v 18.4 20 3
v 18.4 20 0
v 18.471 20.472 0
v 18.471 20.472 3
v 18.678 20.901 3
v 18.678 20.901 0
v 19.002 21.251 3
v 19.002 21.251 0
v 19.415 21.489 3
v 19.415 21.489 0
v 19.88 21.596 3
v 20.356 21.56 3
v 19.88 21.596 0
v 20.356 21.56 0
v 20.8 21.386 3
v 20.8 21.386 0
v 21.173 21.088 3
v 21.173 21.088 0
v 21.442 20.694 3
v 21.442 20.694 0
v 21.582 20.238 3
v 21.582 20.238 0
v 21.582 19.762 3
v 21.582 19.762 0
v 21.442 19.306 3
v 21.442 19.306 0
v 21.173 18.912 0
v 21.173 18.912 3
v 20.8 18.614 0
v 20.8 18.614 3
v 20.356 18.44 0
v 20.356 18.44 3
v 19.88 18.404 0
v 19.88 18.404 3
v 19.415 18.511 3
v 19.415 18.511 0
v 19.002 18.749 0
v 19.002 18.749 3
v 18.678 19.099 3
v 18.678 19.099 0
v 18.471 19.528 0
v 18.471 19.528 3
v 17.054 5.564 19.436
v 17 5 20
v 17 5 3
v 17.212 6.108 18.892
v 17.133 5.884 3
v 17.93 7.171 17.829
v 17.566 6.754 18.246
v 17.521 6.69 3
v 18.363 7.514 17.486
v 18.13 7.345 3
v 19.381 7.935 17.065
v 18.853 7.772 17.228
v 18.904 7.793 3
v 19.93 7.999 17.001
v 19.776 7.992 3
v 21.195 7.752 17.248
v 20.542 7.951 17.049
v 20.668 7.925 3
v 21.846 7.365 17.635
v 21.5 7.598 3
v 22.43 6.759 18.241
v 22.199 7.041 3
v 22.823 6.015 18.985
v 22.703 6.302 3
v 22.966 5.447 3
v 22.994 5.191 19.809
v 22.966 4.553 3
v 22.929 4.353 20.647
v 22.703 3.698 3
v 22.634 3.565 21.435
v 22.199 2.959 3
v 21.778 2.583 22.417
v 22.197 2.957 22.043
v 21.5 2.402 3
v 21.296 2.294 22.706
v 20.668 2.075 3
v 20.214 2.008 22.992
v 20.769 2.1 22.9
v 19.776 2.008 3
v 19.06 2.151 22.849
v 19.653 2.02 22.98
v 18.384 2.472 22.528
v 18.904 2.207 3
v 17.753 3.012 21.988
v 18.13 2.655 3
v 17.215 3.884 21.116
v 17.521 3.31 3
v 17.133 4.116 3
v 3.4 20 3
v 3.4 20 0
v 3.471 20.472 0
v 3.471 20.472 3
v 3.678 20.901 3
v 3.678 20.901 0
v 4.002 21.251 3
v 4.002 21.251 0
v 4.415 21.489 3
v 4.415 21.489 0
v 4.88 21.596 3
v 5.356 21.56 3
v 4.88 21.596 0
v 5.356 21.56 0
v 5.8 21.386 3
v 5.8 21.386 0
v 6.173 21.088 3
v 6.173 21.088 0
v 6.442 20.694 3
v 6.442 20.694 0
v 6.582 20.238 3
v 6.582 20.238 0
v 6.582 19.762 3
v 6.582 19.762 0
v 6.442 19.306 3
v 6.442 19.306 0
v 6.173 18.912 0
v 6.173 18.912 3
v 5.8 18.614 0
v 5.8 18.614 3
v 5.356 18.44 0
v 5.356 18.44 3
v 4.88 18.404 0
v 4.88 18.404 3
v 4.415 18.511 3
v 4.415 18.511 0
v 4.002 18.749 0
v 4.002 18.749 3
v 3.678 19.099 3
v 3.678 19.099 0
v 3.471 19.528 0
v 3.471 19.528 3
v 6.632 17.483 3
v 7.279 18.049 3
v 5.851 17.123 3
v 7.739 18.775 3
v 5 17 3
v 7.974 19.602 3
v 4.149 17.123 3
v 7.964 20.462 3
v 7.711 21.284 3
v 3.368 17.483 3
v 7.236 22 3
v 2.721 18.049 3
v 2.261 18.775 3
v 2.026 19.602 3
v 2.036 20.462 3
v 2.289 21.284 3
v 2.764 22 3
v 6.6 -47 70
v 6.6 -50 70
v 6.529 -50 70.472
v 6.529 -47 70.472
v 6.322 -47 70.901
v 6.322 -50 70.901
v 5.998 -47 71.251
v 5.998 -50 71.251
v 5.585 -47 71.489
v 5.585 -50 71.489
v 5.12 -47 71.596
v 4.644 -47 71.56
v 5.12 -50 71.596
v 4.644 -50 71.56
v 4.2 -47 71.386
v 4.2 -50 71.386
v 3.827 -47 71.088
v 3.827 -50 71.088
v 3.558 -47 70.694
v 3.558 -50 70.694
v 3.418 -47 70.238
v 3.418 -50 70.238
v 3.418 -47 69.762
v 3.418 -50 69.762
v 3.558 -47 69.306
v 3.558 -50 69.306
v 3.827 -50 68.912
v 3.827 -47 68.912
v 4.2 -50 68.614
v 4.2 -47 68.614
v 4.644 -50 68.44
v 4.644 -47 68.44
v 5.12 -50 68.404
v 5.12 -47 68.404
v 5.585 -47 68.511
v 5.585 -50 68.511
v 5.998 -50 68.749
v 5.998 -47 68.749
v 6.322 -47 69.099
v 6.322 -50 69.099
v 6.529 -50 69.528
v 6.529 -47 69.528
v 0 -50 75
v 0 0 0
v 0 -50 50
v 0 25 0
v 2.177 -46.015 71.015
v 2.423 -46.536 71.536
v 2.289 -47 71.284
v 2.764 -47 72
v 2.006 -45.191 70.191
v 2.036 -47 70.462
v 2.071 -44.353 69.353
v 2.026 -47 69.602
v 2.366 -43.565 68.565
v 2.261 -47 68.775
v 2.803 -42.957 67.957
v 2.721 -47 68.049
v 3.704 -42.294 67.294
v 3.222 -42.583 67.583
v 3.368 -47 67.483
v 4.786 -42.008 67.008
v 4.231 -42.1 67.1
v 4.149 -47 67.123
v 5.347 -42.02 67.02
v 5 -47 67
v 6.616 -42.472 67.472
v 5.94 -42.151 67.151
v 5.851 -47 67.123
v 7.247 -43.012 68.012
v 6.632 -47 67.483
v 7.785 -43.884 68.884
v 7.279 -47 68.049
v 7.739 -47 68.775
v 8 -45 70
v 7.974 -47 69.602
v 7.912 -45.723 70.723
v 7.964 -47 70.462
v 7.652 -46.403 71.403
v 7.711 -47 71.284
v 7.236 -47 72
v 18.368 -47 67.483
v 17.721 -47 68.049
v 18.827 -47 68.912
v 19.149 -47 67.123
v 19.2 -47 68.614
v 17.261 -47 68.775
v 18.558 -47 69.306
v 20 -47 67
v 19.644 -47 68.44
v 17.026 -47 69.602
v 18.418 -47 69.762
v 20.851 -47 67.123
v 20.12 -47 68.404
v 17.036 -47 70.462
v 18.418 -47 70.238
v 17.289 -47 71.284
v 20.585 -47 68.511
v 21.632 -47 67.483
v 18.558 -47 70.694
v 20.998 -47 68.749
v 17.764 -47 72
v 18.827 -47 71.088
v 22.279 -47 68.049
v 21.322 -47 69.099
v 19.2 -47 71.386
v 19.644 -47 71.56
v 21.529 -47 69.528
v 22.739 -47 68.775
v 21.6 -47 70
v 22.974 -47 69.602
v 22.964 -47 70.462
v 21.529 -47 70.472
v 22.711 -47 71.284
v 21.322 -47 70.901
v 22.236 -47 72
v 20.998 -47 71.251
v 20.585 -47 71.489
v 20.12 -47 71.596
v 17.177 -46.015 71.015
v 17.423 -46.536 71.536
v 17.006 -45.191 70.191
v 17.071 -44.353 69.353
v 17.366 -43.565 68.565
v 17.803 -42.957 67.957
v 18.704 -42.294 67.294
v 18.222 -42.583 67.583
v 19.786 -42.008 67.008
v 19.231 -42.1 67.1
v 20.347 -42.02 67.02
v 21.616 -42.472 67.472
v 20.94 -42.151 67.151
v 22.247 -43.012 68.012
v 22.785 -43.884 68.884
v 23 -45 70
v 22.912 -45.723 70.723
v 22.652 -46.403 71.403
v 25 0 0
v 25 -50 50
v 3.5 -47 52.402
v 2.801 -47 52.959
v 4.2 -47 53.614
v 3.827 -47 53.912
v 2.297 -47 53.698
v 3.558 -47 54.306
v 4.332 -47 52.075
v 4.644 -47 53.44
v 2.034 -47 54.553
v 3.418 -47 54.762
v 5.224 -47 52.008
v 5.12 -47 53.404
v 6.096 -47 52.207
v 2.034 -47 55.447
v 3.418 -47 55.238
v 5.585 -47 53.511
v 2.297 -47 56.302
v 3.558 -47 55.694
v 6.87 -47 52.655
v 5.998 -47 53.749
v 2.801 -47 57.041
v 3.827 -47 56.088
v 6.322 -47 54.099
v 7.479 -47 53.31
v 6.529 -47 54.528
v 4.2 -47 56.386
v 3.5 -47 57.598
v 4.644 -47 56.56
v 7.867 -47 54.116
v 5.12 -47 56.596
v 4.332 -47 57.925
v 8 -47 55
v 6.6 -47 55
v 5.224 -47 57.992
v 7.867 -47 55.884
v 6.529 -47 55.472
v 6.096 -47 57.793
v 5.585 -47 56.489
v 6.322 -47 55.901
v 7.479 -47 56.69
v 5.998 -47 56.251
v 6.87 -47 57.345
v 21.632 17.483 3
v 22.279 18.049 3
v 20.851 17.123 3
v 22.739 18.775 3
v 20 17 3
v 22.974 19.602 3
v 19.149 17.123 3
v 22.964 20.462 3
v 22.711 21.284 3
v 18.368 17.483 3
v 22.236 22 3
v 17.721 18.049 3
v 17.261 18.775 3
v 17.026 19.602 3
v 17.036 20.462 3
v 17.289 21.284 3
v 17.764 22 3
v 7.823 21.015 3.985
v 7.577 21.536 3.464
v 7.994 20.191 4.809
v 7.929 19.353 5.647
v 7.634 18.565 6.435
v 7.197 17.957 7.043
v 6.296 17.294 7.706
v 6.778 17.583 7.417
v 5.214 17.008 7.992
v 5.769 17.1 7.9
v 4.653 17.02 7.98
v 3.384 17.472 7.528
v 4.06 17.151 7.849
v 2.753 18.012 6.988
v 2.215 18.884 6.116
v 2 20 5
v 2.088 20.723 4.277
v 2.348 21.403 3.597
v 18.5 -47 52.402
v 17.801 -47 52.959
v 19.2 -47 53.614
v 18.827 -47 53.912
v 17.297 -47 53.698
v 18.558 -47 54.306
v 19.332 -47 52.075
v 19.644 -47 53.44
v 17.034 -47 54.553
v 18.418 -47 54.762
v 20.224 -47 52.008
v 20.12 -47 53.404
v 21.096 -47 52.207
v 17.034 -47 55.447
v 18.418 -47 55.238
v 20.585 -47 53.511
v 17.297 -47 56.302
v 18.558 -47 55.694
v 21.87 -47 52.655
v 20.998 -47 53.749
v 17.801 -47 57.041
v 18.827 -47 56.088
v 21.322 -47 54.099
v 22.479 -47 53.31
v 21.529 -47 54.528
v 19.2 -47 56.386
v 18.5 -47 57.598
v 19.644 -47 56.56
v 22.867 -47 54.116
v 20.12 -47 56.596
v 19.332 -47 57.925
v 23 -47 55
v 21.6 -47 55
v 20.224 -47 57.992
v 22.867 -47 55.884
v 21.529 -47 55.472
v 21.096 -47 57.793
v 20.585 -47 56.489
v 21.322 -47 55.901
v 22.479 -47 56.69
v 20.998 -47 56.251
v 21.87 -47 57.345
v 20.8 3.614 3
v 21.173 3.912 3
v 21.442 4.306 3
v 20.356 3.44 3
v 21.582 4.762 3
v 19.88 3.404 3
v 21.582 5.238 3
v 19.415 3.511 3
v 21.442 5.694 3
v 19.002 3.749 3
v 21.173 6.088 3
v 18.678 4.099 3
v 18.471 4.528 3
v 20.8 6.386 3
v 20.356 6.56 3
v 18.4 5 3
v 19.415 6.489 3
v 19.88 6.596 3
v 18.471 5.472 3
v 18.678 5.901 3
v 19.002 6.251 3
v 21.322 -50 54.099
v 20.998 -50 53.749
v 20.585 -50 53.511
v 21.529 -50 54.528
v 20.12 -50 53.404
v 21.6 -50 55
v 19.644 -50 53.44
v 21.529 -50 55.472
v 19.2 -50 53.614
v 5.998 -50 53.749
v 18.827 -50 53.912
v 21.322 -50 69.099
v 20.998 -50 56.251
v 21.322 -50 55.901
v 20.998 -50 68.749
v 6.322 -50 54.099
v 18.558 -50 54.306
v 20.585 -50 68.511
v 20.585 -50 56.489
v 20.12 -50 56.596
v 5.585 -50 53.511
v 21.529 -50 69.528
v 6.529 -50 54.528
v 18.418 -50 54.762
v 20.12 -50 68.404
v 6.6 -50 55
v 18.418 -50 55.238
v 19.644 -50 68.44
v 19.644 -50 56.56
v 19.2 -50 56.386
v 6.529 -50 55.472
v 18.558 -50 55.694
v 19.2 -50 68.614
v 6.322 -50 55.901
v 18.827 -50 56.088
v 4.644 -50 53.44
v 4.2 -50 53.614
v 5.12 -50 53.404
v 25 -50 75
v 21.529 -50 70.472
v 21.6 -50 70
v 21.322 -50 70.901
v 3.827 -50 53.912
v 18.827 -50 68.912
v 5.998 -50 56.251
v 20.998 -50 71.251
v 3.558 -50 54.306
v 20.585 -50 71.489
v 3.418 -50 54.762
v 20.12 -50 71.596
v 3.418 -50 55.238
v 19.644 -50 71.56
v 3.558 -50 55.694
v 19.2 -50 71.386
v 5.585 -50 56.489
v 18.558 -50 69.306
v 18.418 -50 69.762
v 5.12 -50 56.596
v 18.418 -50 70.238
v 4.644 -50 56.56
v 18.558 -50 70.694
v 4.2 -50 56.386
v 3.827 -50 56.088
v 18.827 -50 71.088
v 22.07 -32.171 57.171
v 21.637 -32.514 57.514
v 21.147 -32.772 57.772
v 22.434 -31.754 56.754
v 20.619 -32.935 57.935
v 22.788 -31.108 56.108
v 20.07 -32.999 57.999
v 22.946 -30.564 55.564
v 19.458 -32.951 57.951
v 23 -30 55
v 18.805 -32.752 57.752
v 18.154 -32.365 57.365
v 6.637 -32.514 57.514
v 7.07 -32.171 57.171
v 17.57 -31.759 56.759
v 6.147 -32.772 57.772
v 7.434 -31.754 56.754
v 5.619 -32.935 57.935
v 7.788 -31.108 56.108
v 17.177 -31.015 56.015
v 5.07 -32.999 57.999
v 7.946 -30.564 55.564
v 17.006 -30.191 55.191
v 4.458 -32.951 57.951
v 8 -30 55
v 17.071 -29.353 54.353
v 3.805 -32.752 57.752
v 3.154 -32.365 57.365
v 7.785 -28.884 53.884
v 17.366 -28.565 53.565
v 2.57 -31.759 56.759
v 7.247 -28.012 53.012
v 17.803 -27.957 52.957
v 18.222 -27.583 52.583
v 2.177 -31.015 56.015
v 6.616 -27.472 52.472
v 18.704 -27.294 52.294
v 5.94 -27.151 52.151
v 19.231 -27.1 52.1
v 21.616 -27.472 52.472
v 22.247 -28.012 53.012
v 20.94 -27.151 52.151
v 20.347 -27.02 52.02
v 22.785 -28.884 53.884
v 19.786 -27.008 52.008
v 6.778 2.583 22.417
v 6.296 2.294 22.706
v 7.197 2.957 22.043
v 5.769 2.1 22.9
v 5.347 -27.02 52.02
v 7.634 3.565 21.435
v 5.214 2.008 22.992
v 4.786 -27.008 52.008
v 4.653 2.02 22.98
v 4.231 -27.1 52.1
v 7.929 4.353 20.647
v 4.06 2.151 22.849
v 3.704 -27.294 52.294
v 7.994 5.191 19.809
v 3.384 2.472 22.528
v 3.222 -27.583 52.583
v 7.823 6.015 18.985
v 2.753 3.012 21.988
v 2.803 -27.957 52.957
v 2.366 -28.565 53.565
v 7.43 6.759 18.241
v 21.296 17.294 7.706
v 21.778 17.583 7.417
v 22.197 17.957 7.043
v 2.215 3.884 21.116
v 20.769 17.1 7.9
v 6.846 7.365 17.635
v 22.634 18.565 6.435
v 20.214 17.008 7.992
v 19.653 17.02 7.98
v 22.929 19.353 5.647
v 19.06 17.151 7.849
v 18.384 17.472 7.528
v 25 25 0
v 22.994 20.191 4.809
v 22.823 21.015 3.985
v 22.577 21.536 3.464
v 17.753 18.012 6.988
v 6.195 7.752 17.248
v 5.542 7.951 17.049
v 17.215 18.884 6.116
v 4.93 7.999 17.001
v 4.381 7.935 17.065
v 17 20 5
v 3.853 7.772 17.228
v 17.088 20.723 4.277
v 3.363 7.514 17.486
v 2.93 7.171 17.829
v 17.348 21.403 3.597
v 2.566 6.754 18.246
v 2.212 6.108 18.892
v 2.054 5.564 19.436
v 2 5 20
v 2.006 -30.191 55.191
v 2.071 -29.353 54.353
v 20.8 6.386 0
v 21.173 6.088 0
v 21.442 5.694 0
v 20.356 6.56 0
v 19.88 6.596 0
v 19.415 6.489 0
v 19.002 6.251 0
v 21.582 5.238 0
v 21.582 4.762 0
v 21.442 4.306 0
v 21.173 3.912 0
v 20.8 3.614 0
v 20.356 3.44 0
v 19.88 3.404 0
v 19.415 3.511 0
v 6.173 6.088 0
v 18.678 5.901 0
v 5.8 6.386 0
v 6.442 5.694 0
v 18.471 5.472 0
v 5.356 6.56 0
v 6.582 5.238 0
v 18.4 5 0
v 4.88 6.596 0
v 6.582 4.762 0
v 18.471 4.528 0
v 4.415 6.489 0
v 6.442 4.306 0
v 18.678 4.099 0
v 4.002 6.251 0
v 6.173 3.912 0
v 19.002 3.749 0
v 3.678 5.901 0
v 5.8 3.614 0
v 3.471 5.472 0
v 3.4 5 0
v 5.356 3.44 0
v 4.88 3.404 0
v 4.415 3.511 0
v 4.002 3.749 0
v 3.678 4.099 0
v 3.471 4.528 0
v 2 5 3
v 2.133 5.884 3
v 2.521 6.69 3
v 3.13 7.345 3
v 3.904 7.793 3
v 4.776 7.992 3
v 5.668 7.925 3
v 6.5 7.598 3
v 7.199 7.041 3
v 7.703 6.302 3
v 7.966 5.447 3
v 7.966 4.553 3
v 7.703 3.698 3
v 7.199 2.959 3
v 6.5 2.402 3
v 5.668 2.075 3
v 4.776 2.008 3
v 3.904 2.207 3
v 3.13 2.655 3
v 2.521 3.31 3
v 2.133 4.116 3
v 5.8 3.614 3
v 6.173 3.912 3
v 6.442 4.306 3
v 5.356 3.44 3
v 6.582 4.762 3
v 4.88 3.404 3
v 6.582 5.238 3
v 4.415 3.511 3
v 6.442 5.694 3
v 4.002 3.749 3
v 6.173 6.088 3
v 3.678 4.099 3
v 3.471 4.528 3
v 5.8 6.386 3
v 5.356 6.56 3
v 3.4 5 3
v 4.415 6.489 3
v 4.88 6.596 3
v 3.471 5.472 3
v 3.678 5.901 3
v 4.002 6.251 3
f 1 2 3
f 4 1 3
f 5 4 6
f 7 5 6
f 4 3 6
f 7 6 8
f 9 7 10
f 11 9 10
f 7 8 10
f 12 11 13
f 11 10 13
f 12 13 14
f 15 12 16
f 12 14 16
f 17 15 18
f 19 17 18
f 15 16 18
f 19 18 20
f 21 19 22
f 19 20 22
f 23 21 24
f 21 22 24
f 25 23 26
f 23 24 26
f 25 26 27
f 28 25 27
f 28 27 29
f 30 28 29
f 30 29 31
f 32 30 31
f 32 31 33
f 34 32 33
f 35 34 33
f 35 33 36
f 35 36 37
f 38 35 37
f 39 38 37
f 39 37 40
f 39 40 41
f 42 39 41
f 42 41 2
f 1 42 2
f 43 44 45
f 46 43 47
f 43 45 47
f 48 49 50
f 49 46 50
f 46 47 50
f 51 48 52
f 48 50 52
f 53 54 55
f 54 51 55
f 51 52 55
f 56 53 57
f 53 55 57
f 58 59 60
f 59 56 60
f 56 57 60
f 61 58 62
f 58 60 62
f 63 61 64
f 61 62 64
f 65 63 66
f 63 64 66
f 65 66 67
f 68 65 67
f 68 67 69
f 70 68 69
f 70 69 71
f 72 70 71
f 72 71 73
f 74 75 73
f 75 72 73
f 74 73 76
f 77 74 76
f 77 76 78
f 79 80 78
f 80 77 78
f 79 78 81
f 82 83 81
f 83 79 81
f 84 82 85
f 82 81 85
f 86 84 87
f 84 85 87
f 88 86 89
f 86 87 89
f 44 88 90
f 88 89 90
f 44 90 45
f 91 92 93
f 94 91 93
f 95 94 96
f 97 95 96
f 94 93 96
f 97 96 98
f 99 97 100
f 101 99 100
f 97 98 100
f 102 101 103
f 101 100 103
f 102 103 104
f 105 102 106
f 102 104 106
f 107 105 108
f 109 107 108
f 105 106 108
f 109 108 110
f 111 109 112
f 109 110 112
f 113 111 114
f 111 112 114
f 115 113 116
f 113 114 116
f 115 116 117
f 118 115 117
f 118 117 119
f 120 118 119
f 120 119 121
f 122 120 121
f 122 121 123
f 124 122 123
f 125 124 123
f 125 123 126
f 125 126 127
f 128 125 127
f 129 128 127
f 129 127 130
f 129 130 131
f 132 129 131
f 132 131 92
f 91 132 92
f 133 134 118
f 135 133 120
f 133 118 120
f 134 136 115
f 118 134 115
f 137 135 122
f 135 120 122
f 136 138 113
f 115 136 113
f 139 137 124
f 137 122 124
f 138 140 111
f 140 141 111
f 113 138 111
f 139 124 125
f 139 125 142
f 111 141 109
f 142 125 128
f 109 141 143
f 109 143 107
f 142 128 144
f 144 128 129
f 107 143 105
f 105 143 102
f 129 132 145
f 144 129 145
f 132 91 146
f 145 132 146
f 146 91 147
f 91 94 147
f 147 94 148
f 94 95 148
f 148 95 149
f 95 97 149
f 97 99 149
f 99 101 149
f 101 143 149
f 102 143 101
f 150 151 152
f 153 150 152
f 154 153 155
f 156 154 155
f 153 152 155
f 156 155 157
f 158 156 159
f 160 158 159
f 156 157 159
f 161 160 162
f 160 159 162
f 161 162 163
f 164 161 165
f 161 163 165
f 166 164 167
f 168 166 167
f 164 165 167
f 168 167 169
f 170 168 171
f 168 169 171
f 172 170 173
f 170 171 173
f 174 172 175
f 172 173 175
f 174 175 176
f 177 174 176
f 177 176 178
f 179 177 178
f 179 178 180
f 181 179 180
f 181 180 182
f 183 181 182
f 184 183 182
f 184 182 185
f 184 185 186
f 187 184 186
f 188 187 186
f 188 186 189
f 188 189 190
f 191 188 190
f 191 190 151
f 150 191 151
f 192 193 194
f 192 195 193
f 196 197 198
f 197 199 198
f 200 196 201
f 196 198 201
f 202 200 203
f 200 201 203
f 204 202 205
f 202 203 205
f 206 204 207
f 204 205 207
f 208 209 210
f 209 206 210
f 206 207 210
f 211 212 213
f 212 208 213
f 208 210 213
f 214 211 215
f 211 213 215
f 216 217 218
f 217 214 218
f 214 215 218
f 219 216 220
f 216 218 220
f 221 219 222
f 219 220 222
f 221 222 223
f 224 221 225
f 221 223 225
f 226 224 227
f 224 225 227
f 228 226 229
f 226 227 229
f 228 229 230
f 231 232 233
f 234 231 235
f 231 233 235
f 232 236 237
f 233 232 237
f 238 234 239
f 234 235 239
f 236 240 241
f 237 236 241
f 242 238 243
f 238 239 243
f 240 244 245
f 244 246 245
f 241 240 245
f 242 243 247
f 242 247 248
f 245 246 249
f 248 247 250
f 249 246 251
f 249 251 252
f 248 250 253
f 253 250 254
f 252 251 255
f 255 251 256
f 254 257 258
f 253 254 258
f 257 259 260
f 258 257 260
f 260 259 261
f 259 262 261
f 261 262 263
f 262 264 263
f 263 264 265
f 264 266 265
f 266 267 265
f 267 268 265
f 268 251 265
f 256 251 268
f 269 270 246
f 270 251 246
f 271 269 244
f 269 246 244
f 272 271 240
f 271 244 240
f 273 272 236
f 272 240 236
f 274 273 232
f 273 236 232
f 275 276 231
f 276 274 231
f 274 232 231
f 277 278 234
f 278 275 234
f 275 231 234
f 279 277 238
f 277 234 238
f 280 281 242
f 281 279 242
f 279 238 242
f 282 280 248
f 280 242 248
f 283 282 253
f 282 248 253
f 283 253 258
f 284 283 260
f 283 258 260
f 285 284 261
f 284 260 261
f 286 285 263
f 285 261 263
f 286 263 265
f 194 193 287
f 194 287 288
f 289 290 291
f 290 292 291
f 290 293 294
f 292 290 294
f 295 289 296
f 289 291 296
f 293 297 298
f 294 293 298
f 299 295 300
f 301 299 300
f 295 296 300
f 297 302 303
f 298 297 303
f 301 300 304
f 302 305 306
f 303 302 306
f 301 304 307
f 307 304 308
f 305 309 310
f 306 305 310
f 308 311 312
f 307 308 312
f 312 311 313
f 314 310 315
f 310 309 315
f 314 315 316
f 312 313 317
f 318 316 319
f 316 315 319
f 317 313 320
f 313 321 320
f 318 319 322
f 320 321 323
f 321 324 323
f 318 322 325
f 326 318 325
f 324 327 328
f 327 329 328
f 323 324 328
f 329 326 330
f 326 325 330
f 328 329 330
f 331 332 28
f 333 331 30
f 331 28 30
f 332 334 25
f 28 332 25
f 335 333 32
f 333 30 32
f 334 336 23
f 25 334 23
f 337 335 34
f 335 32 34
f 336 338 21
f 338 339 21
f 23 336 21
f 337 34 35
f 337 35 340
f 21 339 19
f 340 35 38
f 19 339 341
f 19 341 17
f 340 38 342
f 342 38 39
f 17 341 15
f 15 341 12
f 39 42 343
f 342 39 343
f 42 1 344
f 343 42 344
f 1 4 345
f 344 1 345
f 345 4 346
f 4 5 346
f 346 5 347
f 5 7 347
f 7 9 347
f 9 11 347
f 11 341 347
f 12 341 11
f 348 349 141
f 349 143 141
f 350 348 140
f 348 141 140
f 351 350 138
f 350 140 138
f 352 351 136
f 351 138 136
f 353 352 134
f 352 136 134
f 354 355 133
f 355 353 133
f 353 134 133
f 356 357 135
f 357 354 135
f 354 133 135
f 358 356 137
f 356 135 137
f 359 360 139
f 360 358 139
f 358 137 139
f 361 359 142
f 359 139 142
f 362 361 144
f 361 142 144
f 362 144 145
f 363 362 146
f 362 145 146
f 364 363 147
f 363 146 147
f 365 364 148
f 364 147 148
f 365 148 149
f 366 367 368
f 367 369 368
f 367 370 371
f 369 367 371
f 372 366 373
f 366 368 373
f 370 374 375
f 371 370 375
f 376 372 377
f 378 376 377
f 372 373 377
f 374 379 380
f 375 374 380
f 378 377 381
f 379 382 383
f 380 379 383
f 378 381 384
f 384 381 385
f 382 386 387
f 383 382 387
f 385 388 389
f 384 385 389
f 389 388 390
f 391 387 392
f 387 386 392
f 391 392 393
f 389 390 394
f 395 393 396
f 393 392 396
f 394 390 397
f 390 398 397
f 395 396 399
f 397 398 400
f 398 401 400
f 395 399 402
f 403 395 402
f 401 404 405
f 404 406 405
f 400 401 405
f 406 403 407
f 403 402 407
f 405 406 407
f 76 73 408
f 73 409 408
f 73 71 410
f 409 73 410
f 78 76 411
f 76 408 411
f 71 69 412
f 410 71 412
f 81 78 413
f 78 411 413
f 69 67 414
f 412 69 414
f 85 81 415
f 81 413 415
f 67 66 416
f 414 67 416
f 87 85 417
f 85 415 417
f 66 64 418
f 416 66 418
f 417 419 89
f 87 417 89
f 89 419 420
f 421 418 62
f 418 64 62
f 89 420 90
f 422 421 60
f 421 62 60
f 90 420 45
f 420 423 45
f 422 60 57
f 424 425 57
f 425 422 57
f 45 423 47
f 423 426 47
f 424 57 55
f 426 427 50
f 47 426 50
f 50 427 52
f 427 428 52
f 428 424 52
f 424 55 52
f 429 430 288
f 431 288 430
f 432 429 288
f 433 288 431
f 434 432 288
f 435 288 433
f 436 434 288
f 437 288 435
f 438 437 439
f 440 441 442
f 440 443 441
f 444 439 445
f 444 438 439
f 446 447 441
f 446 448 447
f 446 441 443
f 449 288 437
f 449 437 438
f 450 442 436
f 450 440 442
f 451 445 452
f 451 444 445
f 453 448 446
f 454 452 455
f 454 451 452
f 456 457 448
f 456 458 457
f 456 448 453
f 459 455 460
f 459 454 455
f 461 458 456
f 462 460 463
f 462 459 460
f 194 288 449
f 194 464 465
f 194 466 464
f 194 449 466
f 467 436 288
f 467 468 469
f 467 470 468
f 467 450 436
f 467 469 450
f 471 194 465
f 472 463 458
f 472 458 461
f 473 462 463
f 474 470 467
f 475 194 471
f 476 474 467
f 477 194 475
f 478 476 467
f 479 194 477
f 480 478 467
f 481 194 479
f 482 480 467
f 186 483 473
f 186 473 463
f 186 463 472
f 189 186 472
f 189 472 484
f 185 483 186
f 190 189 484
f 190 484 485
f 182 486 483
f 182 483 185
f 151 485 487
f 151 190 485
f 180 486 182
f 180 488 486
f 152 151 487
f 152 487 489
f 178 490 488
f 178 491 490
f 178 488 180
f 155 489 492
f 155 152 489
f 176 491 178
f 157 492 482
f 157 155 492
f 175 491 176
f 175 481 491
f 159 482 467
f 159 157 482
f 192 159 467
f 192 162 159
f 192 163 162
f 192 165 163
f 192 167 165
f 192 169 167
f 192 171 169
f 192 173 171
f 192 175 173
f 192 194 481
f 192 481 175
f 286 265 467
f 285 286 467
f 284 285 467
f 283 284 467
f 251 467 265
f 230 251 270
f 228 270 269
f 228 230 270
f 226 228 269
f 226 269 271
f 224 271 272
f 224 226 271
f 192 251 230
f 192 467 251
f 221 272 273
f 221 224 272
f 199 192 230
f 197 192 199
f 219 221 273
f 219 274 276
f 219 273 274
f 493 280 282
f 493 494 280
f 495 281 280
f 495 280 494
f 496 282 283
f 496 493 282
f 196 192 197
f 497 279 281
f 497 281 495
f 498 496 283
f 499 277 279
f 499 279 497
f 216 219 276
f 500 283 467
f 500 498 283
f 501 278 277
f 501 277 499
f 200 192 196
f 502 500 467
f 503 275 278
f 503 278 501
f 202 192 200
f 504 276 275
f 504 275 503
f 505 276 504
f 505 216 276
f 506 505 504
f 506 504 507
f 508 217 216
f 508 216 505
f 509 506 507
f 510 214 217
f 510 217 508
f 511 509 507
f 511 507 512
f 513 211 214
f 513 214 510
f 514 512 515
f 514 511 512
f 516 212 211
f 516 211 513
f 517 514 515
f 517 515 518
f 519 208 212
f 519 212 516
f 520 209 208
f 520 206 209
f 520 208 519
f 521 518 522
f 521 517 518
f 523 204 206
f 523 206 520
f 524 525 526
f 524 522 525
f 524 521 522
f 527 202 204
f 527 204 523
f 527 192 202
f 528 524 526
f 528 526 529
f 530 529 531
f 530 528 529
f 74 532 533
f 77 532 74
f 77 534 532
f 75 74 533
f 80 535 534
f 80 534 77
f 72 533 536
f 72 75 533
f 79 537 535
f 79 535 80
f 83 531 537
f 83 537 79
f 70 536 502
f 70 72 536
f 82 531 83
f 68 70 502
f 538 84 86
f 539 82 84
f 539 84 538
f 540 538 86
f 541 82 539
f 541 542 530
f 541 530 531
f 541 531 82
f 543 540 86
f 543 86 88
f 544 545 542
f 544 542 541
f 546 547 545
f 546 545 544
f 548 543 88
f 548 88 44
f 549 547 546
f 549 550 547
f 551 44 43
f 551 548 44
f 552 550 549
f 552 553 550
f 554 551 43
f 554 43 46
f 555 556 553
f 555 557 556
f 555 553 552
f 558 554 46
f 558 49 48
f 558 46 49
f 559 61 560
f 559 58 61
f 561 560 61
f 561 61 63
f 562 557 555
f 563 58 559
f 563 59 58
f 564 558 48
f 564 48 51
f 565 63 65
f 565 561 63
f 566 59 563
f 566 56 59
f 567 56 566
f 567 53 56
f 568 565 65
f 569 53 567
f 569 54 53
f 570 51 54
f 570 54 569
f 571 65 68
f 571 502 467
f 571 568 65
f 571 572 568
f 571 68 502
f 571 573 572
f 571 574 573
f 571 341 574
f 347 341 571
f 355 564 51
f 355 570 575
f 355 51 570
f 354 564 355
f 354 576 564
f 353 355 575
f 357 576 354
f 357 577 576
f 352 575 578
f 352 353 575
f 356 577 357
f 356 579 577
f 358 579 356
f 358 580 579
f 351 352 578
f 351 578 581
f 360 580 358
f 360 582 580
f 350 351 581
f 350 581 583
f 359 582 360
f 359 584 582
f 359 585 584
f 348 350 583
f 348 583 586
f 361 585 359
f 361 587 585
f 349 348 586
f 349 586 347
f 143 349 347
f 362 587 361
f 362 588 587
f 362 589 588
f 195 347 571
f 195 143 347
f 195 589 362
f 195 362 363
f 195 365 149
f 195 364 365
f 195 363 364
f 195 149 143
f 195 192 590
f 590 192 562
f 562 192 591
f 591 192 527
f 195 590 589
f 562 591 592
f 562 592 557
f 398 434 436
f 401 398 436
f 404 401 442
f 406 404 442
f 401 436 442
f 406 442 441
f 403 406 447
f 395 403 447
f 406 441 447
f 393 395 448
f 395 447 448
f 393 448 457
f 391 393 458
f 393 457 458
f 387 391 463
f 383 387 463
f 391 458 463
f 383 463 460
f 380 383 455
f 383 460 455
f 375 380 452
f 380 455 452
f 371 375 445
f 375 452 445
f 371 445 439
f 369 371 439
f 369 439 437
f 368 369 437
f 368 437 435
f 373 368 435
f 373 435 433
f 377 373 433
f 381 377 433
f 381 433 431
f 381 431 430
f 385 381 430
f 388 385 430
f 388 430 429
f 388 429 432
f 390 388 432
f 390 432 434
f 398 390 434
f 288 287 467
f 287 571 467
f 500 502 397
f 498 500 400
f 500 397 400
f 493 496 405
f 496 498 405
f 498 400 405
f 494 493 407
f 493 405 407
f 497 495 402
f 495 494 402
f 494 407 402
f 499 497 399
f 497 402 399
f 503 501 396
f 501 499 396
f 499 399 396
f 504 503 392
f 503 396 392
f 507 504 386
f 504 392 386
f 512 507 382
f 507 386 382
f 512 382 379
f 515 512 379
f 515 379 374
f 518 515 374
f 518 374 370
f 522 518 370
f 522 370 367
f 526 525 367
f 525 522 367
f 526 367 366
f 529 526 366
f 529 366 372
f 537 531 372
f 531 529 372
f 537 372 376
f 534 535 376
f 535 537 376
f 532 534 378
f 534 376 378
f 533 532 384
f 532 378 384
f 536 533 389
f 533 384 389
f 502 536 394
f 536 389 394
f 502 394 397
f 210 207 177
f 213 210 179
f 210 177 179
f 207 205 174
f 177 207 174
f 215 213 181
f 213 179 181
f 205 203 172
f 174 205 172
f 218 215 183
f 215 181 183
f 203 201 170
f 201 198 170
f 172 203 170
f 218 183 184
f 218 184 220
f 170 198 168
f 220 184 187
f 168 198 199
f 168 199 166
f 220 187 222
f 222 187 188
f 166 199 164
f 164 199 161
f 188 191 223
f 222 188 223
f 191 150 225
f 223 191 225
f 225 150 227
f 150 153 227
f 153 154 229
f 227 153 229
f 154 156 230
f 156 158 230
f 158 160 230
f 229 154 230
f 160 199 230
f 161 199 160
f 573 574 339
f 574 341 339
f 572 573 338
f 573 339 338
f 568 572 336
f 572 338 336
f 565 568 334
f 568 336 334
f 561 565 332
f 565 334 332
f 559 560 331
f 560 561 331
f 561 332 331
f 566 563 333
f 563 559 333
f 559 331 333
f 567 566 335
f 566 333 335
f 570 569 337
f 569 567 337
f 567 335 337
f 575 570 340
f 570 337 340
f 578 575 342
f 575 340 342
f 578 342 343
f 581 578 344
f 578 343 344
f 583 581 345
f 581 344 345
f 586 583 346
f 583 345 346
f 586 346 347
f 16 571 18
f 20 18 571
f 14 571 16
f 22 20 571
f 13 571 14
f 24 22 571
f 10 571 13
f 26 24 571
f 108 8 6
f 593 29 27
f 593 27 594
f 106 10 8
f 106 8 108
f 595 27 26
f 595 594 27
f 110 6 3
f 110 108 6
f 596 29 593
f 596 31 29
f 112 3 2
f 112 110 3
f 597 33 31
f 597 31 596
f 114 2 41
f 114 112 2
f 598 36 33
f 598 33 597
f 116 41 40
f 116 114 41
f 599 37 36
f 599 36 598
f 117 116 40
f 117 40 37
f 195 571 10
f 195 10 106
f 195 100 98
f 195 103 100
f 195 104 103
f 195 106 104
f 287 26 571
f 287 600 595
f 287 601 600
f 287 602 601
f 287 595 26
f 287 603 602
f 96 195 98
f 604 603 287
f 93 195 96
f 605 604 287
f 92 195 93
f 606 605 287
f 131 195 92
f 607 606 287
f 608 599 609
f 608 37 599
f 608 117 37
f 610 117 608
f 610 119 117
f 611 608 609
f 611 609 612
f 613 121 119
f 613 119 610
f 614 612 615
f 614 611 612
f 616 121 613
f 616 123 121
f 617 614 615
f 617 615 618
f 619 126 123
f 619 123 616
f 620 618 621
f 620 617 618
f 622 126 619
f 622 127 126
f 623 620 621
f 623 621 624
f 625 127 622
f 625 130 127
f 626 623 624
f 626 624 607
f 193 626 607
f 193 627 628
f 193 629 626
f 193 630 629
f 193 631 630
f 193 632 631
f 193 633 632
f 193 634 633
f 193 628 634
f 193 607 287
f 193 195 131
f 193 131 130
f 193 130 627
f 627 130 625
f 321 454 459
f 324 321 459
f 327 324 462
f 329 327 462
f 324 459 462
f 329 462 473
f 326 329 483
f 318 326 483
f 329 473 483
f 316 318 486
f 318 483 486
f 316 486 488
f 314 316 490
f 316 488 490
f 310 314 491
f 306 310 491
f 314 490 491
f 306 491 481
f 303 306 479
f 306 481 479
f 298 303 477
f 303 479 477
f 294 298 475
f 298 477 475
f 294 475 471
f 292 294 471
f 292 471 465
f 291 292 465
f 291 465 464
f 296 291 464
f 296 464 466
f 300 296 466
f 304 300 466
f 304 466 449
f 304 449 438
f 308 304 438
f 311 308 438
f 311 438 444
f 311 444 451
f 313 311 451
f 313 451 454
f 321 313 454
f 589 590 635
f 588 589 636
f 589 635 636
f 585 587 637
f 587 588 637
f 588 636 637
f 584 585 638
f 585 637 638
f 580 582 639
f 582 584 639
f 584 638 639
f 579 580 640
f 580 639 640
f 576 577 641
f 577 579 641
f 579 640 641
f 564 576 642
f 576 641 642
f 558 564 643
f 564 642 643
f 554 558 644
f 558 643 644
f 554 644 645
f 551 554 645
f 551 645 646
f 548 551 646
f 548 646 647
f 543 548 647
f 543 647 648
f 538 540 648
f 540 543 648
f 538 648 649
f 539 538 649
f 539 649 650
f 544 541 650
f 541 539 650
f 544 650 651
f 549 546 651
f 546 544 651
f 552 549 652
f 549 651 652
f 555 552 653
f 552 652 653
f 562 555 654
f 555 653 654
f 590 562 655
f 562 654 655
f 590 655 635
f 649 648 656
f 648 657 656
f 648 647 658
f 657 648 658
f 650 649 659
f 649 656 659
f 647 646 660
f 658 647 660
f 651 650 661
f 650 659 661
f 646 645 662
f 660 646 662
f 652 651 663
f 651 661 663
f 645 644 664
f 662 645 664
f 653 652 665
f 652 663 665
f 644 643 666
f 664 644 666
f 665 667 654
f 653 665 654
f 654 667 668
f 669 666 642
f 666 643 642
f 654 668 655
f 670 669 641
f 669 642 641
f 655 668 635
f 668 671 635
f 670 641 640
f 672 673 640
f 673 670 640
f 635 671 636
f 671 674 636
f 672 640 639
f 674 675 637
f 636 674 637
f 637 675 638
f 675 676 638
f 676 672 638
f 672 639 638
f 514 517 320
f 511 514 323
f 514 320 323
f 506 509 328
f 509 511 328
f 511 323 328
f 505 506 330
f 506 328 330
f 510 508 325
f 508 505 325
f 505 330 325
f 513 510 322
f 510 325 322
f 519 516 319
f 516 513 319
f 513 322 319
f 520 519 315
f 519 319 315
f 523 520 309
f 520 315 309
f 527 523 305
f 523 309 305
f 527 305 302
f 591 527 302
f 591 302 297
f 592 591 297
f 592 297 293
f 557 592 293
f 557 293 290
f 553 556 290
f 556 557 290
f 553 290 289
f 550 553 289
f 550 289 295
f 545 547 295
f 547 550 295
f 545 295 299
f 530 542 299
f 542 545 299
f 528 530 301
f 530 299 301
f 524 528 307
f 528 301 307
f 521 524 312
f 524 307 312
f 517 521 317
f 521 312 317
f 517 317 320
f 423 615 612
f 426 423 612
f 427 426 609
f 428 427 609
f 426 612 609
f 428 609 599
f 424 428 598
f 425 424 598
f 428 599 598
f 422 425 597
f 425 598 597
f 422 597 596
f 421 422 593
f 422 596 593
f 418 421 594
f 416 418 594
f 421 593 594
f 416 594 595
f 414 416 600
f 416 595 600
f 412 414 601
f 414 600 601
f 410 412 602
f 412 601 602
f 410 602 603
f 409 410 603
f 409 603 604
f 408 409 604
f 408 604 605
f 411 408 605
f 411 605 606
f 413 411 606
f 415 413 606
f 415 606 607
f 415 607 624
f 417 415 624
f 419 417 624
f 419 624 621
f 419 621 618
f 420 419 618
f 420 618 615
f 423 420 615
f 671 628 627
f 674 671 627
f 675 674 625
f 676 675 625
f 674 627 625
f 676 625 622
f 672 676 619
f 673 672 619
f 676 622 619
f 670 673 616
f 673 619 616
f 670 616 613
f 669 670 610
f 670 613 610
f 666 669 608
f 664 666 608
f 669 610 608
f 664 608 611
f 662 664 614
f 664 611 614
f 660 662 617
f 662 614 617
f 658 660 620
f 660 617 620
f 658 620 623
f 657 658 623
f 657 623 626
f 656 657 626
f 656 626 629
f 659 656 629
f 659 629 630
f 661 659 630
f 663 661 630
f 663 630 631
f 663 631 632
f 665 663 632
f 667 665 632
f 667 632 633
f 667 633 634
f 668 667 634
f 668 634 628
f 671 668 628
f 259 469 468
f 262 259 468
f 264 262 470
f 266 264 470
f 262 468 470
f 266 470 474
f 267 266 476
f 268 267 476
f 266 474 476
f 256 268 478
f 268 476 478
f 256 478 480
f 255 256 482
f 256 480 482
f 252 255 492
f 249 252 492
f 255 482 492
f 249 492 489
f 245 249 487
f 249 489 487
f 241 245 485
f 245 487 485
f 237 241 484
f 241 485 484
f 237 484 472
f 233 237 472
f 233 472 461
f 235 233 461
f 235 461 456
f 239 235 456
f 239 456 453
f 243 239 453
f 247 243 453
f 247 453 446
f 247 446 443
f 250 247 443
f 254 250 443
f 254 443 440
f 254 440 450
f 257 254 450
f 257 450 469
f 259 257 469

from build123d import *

# Parameters (mm, degrees)
BOSS_EXTRUDE1_DEPTH = 25
CUT_EXTRUDE2_REACH  = 113.972
CUT_EXTRUDE2_START  = -3
SKETCH2_R           = 3
SKETCH2_R_2         = 1.6
CUT_EXTRUDE3_REACH  = 110.972
SKETCH2_3_R         = 1.6
CUT_EXTRUDE7_REACH  = 98.541
CUT_EXTRUDE7_START  = -3
SKETCH3_R           = 3
SKETCH3_R_2         = 1.6
CUT_EXTRUDE8_REACH  = 95.541
SKETCH3_3_R         = 1.6


with BuildPart() as part:
    # Sketch1 → Boss-Extrude1 (new body)
    with BuildSketch(Plane(origin=(0, 0, 0), x_dir=(0, 0, -1), z_dir=(1, 0, 0))):
        Polygon((0, 0), (-50, -50), (-75, -50), (0, 25), align=None)
    extrude(amount=BOSS_EXTRUDE1_DEPTH)

    # Sketch2 → Cut-Extrude2 (cut, up to next)
    with BuildSketch(Plane.XZ.offset(50).offset(CUT_EXTRUDE2_START), mode=Mode.PRIVATE) as cut_extrude2_sk1:
        with Locations((20, 70)):
            Circle(SKETCH2_R)
        with Locations((20, 70)):
            Circle(SKETCH2_R_2, mode=Mode.SUBTRACT)
    cut_extrude2_tool1 = extrude(cut_extrude2_sk1.sketch, amount=-CUT_EXTRUDE2_REACH, mode=Mode.PRIVATE) & part.part
    # Sketch2 → Cut-Extrude2 (cut, up to next)
    with BuildSketch(Plane.XZ.offset(50).offset(CUT_EXTRUDE2_START), mode=Mode.PRIVATE) as cut_extrude2_sk2:
        with Locations((5, 70)):
            Circle(SKETCH2_R)
        with Locations((5, 70)):
            Circle(SKETCH2_R_2, mode=Mode.SUBTRACT)
    cut_extrude2_tool2 = extrude(cut_extrude2_sk2.sketch, amount=-CUT_EXTRUDE2_REACH, mode=Mode.PRIVATE) & part.part
    # Sketch2 → Cut-Extrude2 (cut, up to next)
    with BuildSketch(Plane.XZ.offset(50).offset(CUT_EXTRUDE2_START), mode=Mode.PRIVATE) as cut_extrude2_sk3:
        with Locations((5, 55)):
            Circle(SKETCH2_R)
        with Locations((5, 55)):
            Circle(SKETCH2_R_2, mode=Mode.SUBTRACT)
    cut_extrude2_tool3 = extrude(cut_extrude2_sk3.sketch, amount=-CUT_EXTRUDE2_REACH, mode=Mode.PRIVATE) & part.part
    # Sketch2 → Cut-Extrude2 (cut, up to next)
    with BuildSketch(Plane.XZ.offset(50).offset(CUT_EXTRUDE2_START), mode=Mode.PRIVATE) as cut_extrude2_sk4:
        with Locations((20, 55)):
            Circle(SKETCH2_R)
        with Locations((20, 55)):
            Circle(SKETCH2_R_2, mode=Mode.SUBTRACT)
    cut_extrude2_tool4 = extrude(cut_extrude2_sk4.sketch, amount=-CUT_EXTRUDE2_REACH, mode=Mode.PRIVATE) & part.part
    add(cut_extrude2_tool1.solids().sort_by_distance((17.084853, -47, 70))[0], mode=Mode.SUBTRACT)
    add(cut_extrude2_tool2.solids().sort_by_distance((2.084853, -47, 70))[0], mode=Mode.SUBTRACT)
    add(cut_extrude2_tool3.solids().sort_by_distance((2.084853, -47, 55))[0], mode=Mode.SUBTRACT)
    add(cut_extrude2_tool4.solids().sort_by_distance((17.084853, -47, 55))[0], mode=Mode.SUBTRACT)

    # Sketch2<3> → Cut-Extrude3 (cut, up to next)
    with BuildSketch(Plane.XZ.offset(50), mode=Mode.PRIVATE) as cut_extrude3_sk1:
        with Locations((20, 70)):
            Circle(SKETCH2_3_R)
    cut_extrude3_tool1 = extrude(cut_extrude3_sk1.sketch, amount=-CUT_EXTRUDE3_REACH, mode=Mode.PRIVATE) & part.part
    # Sketch2<3> → Cut-Extrude3 (cut, up to next)
    with BuildSketch(Plane.XZ.offset(50), mode=Mode.PRIVATE) as cut_extrude3_sk2:
        with Locations((5, 70)):
            Circle(SKETCH2_3_R)
    cut_extrude3_tool2 = extrude(cut_extrude3_sk2.sketch, amount=-CUT_EXTRUDE3_REACH, mode=Mode.PRIVATE) & part.part
    # Sketch2<3> → Cut-Extrude3 (cut, up to next)
    with BuildSketch(Plane.XZ.offset(50), mode=Mode.PRIVATE) as cut_extrude3_sk3:
        with Locations((5, 55)):
            Circle(SKETCH2_3_R)
    cut_extrude3_tool3 = extrude(cut_extrude3_sk3.sketch, amount=-CUT_EXTRUDE3_REACH, mode=Mode.PRIVATE) & part.part
    # Sketch2<3> → Cut-Extrude3 (cut, up to next)
    with BuildSketch(Plane.XZ.offset(50), mode=Mode.PRIVATE) as cut_extrude3_sk4:
        with Locations((20, 55)):
            Circle(SKETCH2_3_R)
    cut_extrude3_tool4 = extrude(cut_extrude3_sk4.sketch, amount=-CUT_EXTRUDE3_REACH, mode=Mode.PRIVATE) & part.part
    add(cut_extrude3_tool1.solids().sort_by_distance((20, -50, 70))[0], mode=Mode.SUBTRACT)
    add(cut_extrude3_tool2.solids().sort_by_distance((5, -50, 70))[0], mode=Mode.SUBTRACT)
    add(cut_extrude3_tool3.solids().sort_by_distance((5, -50, 55))[0], mode=Mode.SUBTRACT)
    add(cut_extrude3_tool4.solids().sort_by_distance((20, -50, 55))[0], mode=Mode.SUBTRACT)

    # Sketch3 → Cut-Extrude7 (cut, up to next)
    with BuildSketch(Plane(origin=(0, 0, 0), x_dir=(-1, 0, 0), z_dir=(0, 0, -1)).offset(CUT_EXTRUDE7_START), mode=Mode.PRIVATE) as cut_extrude7_sk1:
        with Locations((-20, 20)):
            Circle(SKETCH3_R)
        with Locations((-20, 20)):
            Circle(SKETCH3_R_2, mode=Mode.SUBTRACT)
    cut_extrude7_tool1 = extrude(cut_extrude7_sk1.sketch, amount=-CUT_EXTRUDE7_REACH, mode=Mode.PRIVATE) & part.part
    # Sketch3 → Cut-Extrude7 (cut, up to next)
    with BuildSketch(Plane(origin=(0, 0, 0), x_dir=(-1, 0, 0), z_dir=(0, 0, -1)).offset(CUT_EXTRUDE7_START), mode=Mode.PRIVATE) as cut_extrude7_sk2:
        with Locations((-20, 5)):
            Circle(SKETCH3_R)
        with Locations((-20, 5)):
            Circle(SKETCH3_R_2, mode=Mode.SUBTRACT)
    cut_extrude7_tool2 = extrude(cut_extrude7_sk2.sketch, amount=-CUT_EXTRUDE7_REACH, mode=Mode.PRIVATE) & part.part
    # Sketch3 → Cut-Extrude7 (cut, up to next)
    with BuildSketch(Plane(origin=(0, 0, 0), x_dir=(-1, 0, 0), z_dir=(0, 0, -1)).offset(CUT_EXTRUDE7_START), mode=Mode.PRIVATE) as cut_extrude7_sk3:
        with Locations((-5, 5)):
            Circle(SKETCH3_R)
        with Locations((-5, 5)):
            Circle(SKETCH3_R_2, mode=Mode.SUBTRACT)
    cut_extrude7_tool3 = extrude(cut_extrude7_sk3.sketch, amount=-CUT_EXTRUDE7_REACH, mode=Mode.PRIVATE) & part.part
    # Sketch3 → Cut-Extrude7 (cut, up to next)
    with BuildSketch(Plane(origin=(0, 0, 0), x_dir=(-1, 0, 0), z_dir=(0, 0, -1)).offset(CUT_EXTRUDE7_START), mode=Mode.PRIVATE) as cut_extrude7_sk4:
        with Locations((-5, 20)):
            Circle(SKETCH3_R)
        with Locations((-5, 20)):
            Circle(SKETCH3_R_2, mode=Mode.SUBTRACT)
    cut_extrude7_tool4 = extrude(cut_extrude7_sk4.sketch, amount=-CUT_EXTRUDE7_REACH, mode=Mode.PRIVATE) & part.part
    add(cut_extrude7_tool1.solids().sort_by_distance((22.915147, 20, 3))[0], mode=Mode.SUBTRACT)
    add(cut_extrude7_tool2.solids().sort_by_distance((22.915147, 5, 3))[0], mode=Mode.SUBTRACT)
    add(cut_extrude7_tool3.solids().sort_by_distance((7.915147, 5, 3))[0], mode=Mode.SUBTRACT)
    add(cut_extrude7_tool4.solids().sort_by_distance((7.915147, 20, 3))[0], mode=Mode.SUBTRACT)

    # Sketch3<3> → Cut-Extrude8 (cut, up to next)
    with BuildSketch(Plane(origin=(0, 0, 0), x_dir=(-1, 0, 0), z_dir=(0, 0, -1)), mode=Mode.PRIVATE) as cut_extrude8_sk1:
        with Locations((-20, 20)):
            Circle(SKETCH3_3_R)
    cut_extrude8_tool1 = extrude(cut_extrude8_sk1.sketch, amount=-CUT_EXTRUDE8_REACH, mode=Mode.PRIVATE) & part.part
    # Sketch3<3> → Cut-Extrude8 (cut, up to next)
    with BuildSketch(Plane(origin=(0, 0, 0), x_dir=(-1, 0, 0), z_dir=(0, 0, -1)), mode=Mode.PRIVATE) as cut_extrude8_sk2:
        with Locations((-20, 5)):
            Circle(SKETCH3_3_R)
    cut_extrude8_tool2 = extrude(cut_extrude8_sk2.sketch, amount=-CUT_EXTRUDE8_REACH, mode=Mode.PRIVATE) & part.part
    # Sketch3<3> → Cut-Extrude8 (cut, up to next)
    with BuildSketch(Plane(origin=(0, 0, 0), x_dir=(-1, 0, 0), z_dir=(0, 0, -1)), mode=Mode.PRIVATE) as cut_extrude8_sk3:
        with Locations((-5, 5)):
            Circle(SKETCH3_3_R)
    cut_extrude8_tool3 = extrude(cut_extrude8_sk3.sketch, amount=-CUT_EXTRUDE8_REACH, mode=Mode.PRIVATE) & part.part
    # Sketch3<3> → Cut-Extrude8 (cut, up to next)
    with BuildSketch(Plane(origin=(0, 0, 0), x_dir=(-1, 0, 0), z_dir=(0, 0, -1)), mode=Mode.PRIVATE) as cut_extrude8_sk4:
        with Locations((-5, 20)):
            Circle(SKETCH3_3_R)
    cut_extrude8_tool4 = extrude(cut_extrude8_sk4.sketch, amount=-CUT_EXTRUDE8_REACH, mode=Mode.PRIVATE) & part.part
    add(cut_extrude8_tool1.solids().sort_by_distance((20, 20, 0))[0], mode=Mode.SUBTRACT)
    add(cut_extrude8_tool2.solids().sort_by_distance((20, 5, 0))[0], mode=Mode.SUBTRACT)
    add(cut_extrude8_tool3.solids().sort_by_distance((5, 5, 0))[0], mode=Mode.SUBTRACT)
    add(cut_extrude8_tool4.solids().sort_by_distance((5, 20, 0))[0], mode=Mode.SUBTRACT)


solid = part.part
